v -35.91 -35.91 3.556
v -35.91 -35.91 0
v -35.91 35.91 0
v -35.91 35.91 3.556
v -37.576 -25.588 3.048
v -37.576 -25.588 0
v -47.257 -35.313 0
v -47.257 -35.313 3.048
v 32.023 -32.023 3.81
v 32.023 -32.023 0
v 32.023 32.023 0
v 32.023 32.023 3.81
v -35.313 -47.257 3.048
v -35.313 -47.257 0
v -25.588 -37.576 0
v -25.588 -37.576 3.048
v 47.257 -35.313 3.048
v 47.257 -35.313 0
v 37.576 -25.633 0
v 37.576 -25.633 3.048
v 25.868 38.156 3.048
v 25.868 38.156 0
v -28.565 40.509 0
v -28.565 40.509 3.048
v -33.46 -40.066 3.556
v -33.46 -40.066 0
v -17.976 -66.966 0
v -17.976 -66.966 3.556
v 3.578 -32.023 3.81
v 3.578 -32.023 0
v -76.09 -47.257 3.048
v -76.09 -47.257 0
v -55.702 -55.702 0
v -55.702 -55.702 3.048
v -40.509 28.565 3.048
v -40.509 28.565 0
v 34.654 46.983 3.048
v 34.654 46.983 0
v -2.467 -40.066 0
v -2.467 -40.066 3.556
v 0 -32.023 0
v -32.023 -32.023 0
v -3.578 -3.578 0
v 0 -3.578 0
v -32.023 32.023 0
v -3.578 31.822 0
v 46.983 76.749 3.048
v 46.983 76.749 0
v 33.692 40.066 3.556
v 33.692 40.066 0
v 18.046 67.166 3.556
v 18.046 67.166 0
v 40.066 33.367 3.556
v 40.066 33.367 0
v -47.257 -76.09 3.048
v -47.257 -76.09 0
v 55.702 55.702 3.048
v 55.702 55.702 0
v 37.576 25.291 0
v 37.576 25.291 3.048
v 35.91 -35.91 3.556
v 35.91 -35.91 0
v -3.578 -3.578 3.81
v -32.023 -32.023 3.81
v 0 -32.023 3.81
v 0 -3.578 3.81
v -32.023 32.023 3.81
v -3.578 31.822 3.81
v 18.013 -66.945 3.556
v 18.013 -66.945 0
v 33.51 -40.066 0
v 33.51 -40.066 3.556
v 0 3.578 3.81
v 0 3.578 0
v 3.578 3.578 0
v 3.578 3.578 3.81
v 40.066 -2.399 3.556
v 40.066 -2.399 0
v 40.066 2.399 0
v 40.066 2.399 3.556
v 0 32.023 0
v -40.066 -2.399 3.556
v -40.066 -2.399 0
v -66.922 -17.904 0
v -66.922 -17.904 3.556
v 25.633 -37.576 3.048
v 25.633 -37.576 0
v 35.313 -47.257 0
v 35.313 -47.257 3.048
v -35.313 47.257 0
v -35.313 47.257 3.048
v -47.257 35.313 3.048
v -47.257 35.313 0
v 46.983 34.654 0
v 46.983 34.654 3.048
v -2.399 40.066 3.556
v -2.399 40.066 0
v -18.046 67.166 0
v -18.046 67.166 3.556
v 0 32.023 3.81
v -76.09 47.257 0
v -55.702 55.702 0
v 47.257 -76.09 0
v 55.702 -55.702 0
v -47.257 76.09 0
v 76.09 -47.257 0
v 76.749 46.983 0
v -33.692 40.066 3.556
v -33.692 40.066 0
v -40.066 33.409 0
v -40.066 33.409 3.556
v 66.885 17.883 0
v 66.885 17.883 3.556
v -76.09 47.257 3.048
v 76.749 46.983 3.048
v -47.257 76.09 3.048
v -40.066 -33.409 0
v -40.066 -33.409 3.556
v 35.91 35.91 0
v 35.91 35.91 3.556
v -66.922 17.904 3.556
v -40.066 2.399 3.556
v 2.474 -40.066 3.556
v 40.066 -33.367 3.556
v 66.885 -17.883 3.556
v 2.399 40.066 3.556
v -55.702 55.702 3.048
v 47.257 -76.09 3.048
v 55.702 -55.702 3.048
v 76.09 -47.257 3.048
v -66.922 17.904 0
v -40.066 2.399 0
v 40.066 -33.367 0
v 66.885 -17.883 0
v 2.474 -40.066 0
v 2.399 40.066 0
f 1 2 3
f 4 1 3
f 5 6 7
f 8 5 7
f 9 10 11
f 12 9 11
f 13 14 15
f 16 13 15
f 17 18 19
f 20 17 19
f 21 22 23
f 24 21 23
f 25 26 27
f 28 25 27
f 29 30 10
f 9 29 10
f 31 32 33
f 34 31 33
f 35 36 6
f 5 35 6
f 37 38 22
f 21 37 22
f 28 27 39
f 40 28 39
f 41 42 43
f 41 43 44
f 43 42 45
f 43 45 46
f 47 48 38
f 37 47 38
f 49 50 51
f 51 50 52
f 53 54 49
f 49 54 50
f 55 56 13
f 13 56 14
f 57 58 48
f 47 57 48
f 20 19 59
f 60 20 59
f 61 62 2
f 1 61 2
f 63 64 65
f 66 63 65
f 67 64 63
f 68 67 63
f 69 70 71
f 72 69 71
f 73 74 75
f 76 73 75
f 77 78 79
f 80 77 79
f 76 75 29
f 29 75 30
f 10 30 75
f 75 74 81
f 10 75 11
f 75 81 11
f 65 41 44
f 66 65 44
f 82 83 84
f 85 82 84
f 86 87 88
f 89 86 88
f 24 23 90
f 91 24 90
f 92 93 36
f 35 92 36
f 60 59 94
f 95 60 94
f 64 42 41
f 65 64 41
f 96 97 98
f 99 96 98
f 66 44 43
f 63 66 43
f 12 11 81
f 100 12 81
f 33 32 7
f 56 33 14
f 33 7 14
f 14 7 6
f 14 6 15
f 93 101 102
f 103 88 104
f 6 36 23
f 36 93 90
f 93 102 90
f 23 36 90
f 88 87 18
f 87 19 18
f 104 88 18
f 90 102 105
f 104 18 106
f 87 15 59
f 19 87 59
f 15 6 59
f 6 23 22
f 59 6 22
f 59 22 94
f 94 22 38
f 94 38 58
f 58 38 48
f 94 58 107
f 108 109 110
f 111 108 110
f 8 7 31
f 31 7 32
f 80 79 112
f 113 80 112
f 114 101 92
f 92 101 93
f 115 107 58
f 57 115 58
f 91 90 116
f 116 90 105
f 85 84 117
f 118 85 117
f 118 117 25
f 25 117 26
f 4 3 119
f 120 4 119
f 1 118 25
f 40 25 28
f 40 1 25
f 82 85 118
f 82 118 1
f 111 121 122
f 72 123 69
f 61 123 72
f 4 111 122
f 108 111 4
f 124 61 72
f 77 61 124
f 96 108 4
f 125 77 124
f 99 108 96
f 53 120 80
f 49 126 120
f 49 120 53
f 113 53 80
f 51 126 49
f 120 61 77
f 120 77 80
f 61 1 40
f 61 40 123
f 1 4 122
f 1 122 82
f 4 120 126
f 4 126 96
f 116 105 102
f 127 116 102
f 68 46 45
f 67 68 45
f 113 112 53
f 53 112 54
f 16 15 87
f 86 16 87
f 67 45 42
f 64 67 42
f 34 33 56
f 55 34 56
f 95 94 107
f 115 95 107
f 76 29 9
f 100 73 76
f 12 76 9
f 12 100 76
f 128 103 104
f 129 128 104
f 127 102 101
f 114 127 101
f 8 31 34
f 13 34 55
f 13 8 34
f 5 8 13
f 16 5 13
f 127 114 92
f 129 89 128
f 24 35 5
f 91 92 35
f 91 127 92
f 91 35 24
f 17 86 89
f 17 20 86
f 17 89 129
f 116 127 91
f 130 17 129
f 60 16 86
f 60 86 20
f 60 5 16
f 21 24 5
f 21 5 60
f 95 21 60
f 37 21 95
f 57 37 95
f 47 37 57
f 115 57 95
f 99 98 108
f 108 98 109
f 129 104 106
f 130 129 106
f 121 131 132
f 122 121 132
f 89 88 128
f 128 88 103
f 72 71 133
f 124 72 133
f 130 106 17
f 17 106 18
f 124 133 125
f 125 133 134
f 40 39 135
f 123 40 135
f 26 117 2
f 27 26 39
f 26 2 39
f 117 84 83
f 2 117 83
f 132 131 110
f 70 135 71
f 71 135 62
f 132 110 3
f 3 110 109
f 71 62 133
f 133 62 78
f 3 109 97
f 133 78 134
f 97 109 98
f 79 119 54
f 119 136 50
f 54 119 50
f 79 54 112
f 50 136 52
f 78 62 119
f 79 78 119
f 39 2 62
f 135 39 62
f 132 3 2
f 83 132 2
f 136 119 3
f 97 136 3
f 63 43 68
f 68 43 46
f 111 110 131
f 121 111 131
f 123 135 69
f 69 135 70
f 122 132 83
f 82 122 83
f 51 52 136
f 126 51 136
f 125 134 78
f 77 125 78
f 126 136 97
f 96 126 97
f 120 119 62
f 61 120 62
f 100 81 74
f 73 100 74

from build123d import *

# Parameters (mm, degrees)
F1_DEPTH = 3.81
F3_DEPTH = 3.556
F5_DEPTH = 3.048


with BuildPart() as f1:
    # F0 (on Top) → F1 (new body)
    with BuildSketch(Plane.XY):
        Polygon((32.022782, -32.022782), (32.022782, 32.022782), (0, 32.022782), (0, 3.577671), (3.577671, 3.577671), (3.577671, -3.577671), (3.577671, -32.022782), align=None)
        Polygon((-32.022782, 32.022782), (-32.022782, -32.022782), (0, -32.022782), (0, -3.577671), (-3.577671, -3.577671), (-3.577671, 3.577671), (-3.577671, 31.822301), align=None)
    extrude(amount=F1_DEPTH)


with BuildPart() as f3:
    # F2 (on Top) → F3 (new body)
    with BuildSketch(Plane.XY):
        Polygon((-17.976414, -66.965935), (-2.466899, -40.066283), (0, -40.066283), (0.003342, -35.910327), (-35.910327, -35.910327), (-36.762996, -36.737791), (-33.459709, -40.066283), align=None)
        Polygon((0.003342, -35.910327), (0, -40.066283), (2.473583, -40.066283), (18.012935, -66.94485), (33.510293, -40.066283), (36.788288, -36.716752), (35.910327, -35.910327), align=None)
        Polygon((35.910327, 0), (35.910327, -35.910327), (36.788288, -36.716752), (40.066283, -33.367221), (66.885166, -17.883332), (40.066283, -2.399442), (40.066283, 0), align=None)
        Polygon((-36.762996, -36.737791), (-35.910327, -35.910327), (-35.910327, 0), (-40.066283, 0), (-40.066283, -2.399442), (-66.921607, -17.904371), (-40.066283, -33.409299), align=None)
        Polygon((35.910327, 35.910327), (35.910327, 0), (40.066283, 0), (40.066283, 2.399442), (66.885166, 17.883332), (40.066283, 33.367221), (36.879068, 36.716752), align=None)
        Polygon((-40.066283, 0), (-35.910327, 0), (-35.910327, 35.910327), (-36.879068, 36.737791), (-40.066283, 33.409299), (-66.921607, 17.904371), (-40.066283, 2.399442), align=None)
        Polygon((0, 35.910327), (35.910327, 35.910327), (36.879068, 36.716752), (33.691853, 40.066283), (18.045648, 67.166306), (2.399442, 40.066283), (0, 40.066283), align=None)
        Polygon((-36.879068, 36.737791), (-35.910327, 35.910327), (0, 35.910327), (0, 40.066283), (-2.399442, 40.066283), (-18.045648, 67.166306), (-33.691853, 40.066283), align=None)
    extrude(amount=F3_DEPTH)


with BuildPart() as f5:
    # F4 (on Top) → F5 (new body)
    with BuildSketch(Plane.XY):
        Polygon((37.576416, 25.29111), (46.983489, 34.654027), (34.654027, 46.983489), (25.868097, 38.156123), (-28.565463, 40.508624), (-35.313485, 47.256646), (-47.256646, 35.313485), (-40.508624, 28.565463), (-37.576416, -25.587602), (-47.256646, -35.313485), (-35.313485, -47.256646), (-25.587602, -37.576416), (25.633255, -37.576416), (35.313485, -47.256646), (47.256646, -35.313485), (37.576416, -25.633255), align=None)
        Polygon((34.654027, 46.983489), (46.983489, 34.654027), (76.749444, 46.983489), (55.701735, 55.701735), (46.983489, 76.749444), align=None)
        Polygon((76.089986, -47.256646), (47.256646, -35.313485), (35.313485, -47.256646), (47.256646, -76.089986), (55.701735, -55.701735), align=None)
        Polygon((-47.256646, 35.313485), (-35.313485, 47.256646), (-47.256646, 76.089986), (-55.701735, 55.701735), (-76.089986, 47.256646), align=None)
        Polygon((-47.256646, -76.089986), (-35.313485, -47.256646), (-47.256646, -35.313485), (-76.089986, -47.256646), (-55.701735, -55.701735), align=None)
    extrude(amount=F5_DEPTH)


solid = Compound([f1.part, f3.part, f5.part])
